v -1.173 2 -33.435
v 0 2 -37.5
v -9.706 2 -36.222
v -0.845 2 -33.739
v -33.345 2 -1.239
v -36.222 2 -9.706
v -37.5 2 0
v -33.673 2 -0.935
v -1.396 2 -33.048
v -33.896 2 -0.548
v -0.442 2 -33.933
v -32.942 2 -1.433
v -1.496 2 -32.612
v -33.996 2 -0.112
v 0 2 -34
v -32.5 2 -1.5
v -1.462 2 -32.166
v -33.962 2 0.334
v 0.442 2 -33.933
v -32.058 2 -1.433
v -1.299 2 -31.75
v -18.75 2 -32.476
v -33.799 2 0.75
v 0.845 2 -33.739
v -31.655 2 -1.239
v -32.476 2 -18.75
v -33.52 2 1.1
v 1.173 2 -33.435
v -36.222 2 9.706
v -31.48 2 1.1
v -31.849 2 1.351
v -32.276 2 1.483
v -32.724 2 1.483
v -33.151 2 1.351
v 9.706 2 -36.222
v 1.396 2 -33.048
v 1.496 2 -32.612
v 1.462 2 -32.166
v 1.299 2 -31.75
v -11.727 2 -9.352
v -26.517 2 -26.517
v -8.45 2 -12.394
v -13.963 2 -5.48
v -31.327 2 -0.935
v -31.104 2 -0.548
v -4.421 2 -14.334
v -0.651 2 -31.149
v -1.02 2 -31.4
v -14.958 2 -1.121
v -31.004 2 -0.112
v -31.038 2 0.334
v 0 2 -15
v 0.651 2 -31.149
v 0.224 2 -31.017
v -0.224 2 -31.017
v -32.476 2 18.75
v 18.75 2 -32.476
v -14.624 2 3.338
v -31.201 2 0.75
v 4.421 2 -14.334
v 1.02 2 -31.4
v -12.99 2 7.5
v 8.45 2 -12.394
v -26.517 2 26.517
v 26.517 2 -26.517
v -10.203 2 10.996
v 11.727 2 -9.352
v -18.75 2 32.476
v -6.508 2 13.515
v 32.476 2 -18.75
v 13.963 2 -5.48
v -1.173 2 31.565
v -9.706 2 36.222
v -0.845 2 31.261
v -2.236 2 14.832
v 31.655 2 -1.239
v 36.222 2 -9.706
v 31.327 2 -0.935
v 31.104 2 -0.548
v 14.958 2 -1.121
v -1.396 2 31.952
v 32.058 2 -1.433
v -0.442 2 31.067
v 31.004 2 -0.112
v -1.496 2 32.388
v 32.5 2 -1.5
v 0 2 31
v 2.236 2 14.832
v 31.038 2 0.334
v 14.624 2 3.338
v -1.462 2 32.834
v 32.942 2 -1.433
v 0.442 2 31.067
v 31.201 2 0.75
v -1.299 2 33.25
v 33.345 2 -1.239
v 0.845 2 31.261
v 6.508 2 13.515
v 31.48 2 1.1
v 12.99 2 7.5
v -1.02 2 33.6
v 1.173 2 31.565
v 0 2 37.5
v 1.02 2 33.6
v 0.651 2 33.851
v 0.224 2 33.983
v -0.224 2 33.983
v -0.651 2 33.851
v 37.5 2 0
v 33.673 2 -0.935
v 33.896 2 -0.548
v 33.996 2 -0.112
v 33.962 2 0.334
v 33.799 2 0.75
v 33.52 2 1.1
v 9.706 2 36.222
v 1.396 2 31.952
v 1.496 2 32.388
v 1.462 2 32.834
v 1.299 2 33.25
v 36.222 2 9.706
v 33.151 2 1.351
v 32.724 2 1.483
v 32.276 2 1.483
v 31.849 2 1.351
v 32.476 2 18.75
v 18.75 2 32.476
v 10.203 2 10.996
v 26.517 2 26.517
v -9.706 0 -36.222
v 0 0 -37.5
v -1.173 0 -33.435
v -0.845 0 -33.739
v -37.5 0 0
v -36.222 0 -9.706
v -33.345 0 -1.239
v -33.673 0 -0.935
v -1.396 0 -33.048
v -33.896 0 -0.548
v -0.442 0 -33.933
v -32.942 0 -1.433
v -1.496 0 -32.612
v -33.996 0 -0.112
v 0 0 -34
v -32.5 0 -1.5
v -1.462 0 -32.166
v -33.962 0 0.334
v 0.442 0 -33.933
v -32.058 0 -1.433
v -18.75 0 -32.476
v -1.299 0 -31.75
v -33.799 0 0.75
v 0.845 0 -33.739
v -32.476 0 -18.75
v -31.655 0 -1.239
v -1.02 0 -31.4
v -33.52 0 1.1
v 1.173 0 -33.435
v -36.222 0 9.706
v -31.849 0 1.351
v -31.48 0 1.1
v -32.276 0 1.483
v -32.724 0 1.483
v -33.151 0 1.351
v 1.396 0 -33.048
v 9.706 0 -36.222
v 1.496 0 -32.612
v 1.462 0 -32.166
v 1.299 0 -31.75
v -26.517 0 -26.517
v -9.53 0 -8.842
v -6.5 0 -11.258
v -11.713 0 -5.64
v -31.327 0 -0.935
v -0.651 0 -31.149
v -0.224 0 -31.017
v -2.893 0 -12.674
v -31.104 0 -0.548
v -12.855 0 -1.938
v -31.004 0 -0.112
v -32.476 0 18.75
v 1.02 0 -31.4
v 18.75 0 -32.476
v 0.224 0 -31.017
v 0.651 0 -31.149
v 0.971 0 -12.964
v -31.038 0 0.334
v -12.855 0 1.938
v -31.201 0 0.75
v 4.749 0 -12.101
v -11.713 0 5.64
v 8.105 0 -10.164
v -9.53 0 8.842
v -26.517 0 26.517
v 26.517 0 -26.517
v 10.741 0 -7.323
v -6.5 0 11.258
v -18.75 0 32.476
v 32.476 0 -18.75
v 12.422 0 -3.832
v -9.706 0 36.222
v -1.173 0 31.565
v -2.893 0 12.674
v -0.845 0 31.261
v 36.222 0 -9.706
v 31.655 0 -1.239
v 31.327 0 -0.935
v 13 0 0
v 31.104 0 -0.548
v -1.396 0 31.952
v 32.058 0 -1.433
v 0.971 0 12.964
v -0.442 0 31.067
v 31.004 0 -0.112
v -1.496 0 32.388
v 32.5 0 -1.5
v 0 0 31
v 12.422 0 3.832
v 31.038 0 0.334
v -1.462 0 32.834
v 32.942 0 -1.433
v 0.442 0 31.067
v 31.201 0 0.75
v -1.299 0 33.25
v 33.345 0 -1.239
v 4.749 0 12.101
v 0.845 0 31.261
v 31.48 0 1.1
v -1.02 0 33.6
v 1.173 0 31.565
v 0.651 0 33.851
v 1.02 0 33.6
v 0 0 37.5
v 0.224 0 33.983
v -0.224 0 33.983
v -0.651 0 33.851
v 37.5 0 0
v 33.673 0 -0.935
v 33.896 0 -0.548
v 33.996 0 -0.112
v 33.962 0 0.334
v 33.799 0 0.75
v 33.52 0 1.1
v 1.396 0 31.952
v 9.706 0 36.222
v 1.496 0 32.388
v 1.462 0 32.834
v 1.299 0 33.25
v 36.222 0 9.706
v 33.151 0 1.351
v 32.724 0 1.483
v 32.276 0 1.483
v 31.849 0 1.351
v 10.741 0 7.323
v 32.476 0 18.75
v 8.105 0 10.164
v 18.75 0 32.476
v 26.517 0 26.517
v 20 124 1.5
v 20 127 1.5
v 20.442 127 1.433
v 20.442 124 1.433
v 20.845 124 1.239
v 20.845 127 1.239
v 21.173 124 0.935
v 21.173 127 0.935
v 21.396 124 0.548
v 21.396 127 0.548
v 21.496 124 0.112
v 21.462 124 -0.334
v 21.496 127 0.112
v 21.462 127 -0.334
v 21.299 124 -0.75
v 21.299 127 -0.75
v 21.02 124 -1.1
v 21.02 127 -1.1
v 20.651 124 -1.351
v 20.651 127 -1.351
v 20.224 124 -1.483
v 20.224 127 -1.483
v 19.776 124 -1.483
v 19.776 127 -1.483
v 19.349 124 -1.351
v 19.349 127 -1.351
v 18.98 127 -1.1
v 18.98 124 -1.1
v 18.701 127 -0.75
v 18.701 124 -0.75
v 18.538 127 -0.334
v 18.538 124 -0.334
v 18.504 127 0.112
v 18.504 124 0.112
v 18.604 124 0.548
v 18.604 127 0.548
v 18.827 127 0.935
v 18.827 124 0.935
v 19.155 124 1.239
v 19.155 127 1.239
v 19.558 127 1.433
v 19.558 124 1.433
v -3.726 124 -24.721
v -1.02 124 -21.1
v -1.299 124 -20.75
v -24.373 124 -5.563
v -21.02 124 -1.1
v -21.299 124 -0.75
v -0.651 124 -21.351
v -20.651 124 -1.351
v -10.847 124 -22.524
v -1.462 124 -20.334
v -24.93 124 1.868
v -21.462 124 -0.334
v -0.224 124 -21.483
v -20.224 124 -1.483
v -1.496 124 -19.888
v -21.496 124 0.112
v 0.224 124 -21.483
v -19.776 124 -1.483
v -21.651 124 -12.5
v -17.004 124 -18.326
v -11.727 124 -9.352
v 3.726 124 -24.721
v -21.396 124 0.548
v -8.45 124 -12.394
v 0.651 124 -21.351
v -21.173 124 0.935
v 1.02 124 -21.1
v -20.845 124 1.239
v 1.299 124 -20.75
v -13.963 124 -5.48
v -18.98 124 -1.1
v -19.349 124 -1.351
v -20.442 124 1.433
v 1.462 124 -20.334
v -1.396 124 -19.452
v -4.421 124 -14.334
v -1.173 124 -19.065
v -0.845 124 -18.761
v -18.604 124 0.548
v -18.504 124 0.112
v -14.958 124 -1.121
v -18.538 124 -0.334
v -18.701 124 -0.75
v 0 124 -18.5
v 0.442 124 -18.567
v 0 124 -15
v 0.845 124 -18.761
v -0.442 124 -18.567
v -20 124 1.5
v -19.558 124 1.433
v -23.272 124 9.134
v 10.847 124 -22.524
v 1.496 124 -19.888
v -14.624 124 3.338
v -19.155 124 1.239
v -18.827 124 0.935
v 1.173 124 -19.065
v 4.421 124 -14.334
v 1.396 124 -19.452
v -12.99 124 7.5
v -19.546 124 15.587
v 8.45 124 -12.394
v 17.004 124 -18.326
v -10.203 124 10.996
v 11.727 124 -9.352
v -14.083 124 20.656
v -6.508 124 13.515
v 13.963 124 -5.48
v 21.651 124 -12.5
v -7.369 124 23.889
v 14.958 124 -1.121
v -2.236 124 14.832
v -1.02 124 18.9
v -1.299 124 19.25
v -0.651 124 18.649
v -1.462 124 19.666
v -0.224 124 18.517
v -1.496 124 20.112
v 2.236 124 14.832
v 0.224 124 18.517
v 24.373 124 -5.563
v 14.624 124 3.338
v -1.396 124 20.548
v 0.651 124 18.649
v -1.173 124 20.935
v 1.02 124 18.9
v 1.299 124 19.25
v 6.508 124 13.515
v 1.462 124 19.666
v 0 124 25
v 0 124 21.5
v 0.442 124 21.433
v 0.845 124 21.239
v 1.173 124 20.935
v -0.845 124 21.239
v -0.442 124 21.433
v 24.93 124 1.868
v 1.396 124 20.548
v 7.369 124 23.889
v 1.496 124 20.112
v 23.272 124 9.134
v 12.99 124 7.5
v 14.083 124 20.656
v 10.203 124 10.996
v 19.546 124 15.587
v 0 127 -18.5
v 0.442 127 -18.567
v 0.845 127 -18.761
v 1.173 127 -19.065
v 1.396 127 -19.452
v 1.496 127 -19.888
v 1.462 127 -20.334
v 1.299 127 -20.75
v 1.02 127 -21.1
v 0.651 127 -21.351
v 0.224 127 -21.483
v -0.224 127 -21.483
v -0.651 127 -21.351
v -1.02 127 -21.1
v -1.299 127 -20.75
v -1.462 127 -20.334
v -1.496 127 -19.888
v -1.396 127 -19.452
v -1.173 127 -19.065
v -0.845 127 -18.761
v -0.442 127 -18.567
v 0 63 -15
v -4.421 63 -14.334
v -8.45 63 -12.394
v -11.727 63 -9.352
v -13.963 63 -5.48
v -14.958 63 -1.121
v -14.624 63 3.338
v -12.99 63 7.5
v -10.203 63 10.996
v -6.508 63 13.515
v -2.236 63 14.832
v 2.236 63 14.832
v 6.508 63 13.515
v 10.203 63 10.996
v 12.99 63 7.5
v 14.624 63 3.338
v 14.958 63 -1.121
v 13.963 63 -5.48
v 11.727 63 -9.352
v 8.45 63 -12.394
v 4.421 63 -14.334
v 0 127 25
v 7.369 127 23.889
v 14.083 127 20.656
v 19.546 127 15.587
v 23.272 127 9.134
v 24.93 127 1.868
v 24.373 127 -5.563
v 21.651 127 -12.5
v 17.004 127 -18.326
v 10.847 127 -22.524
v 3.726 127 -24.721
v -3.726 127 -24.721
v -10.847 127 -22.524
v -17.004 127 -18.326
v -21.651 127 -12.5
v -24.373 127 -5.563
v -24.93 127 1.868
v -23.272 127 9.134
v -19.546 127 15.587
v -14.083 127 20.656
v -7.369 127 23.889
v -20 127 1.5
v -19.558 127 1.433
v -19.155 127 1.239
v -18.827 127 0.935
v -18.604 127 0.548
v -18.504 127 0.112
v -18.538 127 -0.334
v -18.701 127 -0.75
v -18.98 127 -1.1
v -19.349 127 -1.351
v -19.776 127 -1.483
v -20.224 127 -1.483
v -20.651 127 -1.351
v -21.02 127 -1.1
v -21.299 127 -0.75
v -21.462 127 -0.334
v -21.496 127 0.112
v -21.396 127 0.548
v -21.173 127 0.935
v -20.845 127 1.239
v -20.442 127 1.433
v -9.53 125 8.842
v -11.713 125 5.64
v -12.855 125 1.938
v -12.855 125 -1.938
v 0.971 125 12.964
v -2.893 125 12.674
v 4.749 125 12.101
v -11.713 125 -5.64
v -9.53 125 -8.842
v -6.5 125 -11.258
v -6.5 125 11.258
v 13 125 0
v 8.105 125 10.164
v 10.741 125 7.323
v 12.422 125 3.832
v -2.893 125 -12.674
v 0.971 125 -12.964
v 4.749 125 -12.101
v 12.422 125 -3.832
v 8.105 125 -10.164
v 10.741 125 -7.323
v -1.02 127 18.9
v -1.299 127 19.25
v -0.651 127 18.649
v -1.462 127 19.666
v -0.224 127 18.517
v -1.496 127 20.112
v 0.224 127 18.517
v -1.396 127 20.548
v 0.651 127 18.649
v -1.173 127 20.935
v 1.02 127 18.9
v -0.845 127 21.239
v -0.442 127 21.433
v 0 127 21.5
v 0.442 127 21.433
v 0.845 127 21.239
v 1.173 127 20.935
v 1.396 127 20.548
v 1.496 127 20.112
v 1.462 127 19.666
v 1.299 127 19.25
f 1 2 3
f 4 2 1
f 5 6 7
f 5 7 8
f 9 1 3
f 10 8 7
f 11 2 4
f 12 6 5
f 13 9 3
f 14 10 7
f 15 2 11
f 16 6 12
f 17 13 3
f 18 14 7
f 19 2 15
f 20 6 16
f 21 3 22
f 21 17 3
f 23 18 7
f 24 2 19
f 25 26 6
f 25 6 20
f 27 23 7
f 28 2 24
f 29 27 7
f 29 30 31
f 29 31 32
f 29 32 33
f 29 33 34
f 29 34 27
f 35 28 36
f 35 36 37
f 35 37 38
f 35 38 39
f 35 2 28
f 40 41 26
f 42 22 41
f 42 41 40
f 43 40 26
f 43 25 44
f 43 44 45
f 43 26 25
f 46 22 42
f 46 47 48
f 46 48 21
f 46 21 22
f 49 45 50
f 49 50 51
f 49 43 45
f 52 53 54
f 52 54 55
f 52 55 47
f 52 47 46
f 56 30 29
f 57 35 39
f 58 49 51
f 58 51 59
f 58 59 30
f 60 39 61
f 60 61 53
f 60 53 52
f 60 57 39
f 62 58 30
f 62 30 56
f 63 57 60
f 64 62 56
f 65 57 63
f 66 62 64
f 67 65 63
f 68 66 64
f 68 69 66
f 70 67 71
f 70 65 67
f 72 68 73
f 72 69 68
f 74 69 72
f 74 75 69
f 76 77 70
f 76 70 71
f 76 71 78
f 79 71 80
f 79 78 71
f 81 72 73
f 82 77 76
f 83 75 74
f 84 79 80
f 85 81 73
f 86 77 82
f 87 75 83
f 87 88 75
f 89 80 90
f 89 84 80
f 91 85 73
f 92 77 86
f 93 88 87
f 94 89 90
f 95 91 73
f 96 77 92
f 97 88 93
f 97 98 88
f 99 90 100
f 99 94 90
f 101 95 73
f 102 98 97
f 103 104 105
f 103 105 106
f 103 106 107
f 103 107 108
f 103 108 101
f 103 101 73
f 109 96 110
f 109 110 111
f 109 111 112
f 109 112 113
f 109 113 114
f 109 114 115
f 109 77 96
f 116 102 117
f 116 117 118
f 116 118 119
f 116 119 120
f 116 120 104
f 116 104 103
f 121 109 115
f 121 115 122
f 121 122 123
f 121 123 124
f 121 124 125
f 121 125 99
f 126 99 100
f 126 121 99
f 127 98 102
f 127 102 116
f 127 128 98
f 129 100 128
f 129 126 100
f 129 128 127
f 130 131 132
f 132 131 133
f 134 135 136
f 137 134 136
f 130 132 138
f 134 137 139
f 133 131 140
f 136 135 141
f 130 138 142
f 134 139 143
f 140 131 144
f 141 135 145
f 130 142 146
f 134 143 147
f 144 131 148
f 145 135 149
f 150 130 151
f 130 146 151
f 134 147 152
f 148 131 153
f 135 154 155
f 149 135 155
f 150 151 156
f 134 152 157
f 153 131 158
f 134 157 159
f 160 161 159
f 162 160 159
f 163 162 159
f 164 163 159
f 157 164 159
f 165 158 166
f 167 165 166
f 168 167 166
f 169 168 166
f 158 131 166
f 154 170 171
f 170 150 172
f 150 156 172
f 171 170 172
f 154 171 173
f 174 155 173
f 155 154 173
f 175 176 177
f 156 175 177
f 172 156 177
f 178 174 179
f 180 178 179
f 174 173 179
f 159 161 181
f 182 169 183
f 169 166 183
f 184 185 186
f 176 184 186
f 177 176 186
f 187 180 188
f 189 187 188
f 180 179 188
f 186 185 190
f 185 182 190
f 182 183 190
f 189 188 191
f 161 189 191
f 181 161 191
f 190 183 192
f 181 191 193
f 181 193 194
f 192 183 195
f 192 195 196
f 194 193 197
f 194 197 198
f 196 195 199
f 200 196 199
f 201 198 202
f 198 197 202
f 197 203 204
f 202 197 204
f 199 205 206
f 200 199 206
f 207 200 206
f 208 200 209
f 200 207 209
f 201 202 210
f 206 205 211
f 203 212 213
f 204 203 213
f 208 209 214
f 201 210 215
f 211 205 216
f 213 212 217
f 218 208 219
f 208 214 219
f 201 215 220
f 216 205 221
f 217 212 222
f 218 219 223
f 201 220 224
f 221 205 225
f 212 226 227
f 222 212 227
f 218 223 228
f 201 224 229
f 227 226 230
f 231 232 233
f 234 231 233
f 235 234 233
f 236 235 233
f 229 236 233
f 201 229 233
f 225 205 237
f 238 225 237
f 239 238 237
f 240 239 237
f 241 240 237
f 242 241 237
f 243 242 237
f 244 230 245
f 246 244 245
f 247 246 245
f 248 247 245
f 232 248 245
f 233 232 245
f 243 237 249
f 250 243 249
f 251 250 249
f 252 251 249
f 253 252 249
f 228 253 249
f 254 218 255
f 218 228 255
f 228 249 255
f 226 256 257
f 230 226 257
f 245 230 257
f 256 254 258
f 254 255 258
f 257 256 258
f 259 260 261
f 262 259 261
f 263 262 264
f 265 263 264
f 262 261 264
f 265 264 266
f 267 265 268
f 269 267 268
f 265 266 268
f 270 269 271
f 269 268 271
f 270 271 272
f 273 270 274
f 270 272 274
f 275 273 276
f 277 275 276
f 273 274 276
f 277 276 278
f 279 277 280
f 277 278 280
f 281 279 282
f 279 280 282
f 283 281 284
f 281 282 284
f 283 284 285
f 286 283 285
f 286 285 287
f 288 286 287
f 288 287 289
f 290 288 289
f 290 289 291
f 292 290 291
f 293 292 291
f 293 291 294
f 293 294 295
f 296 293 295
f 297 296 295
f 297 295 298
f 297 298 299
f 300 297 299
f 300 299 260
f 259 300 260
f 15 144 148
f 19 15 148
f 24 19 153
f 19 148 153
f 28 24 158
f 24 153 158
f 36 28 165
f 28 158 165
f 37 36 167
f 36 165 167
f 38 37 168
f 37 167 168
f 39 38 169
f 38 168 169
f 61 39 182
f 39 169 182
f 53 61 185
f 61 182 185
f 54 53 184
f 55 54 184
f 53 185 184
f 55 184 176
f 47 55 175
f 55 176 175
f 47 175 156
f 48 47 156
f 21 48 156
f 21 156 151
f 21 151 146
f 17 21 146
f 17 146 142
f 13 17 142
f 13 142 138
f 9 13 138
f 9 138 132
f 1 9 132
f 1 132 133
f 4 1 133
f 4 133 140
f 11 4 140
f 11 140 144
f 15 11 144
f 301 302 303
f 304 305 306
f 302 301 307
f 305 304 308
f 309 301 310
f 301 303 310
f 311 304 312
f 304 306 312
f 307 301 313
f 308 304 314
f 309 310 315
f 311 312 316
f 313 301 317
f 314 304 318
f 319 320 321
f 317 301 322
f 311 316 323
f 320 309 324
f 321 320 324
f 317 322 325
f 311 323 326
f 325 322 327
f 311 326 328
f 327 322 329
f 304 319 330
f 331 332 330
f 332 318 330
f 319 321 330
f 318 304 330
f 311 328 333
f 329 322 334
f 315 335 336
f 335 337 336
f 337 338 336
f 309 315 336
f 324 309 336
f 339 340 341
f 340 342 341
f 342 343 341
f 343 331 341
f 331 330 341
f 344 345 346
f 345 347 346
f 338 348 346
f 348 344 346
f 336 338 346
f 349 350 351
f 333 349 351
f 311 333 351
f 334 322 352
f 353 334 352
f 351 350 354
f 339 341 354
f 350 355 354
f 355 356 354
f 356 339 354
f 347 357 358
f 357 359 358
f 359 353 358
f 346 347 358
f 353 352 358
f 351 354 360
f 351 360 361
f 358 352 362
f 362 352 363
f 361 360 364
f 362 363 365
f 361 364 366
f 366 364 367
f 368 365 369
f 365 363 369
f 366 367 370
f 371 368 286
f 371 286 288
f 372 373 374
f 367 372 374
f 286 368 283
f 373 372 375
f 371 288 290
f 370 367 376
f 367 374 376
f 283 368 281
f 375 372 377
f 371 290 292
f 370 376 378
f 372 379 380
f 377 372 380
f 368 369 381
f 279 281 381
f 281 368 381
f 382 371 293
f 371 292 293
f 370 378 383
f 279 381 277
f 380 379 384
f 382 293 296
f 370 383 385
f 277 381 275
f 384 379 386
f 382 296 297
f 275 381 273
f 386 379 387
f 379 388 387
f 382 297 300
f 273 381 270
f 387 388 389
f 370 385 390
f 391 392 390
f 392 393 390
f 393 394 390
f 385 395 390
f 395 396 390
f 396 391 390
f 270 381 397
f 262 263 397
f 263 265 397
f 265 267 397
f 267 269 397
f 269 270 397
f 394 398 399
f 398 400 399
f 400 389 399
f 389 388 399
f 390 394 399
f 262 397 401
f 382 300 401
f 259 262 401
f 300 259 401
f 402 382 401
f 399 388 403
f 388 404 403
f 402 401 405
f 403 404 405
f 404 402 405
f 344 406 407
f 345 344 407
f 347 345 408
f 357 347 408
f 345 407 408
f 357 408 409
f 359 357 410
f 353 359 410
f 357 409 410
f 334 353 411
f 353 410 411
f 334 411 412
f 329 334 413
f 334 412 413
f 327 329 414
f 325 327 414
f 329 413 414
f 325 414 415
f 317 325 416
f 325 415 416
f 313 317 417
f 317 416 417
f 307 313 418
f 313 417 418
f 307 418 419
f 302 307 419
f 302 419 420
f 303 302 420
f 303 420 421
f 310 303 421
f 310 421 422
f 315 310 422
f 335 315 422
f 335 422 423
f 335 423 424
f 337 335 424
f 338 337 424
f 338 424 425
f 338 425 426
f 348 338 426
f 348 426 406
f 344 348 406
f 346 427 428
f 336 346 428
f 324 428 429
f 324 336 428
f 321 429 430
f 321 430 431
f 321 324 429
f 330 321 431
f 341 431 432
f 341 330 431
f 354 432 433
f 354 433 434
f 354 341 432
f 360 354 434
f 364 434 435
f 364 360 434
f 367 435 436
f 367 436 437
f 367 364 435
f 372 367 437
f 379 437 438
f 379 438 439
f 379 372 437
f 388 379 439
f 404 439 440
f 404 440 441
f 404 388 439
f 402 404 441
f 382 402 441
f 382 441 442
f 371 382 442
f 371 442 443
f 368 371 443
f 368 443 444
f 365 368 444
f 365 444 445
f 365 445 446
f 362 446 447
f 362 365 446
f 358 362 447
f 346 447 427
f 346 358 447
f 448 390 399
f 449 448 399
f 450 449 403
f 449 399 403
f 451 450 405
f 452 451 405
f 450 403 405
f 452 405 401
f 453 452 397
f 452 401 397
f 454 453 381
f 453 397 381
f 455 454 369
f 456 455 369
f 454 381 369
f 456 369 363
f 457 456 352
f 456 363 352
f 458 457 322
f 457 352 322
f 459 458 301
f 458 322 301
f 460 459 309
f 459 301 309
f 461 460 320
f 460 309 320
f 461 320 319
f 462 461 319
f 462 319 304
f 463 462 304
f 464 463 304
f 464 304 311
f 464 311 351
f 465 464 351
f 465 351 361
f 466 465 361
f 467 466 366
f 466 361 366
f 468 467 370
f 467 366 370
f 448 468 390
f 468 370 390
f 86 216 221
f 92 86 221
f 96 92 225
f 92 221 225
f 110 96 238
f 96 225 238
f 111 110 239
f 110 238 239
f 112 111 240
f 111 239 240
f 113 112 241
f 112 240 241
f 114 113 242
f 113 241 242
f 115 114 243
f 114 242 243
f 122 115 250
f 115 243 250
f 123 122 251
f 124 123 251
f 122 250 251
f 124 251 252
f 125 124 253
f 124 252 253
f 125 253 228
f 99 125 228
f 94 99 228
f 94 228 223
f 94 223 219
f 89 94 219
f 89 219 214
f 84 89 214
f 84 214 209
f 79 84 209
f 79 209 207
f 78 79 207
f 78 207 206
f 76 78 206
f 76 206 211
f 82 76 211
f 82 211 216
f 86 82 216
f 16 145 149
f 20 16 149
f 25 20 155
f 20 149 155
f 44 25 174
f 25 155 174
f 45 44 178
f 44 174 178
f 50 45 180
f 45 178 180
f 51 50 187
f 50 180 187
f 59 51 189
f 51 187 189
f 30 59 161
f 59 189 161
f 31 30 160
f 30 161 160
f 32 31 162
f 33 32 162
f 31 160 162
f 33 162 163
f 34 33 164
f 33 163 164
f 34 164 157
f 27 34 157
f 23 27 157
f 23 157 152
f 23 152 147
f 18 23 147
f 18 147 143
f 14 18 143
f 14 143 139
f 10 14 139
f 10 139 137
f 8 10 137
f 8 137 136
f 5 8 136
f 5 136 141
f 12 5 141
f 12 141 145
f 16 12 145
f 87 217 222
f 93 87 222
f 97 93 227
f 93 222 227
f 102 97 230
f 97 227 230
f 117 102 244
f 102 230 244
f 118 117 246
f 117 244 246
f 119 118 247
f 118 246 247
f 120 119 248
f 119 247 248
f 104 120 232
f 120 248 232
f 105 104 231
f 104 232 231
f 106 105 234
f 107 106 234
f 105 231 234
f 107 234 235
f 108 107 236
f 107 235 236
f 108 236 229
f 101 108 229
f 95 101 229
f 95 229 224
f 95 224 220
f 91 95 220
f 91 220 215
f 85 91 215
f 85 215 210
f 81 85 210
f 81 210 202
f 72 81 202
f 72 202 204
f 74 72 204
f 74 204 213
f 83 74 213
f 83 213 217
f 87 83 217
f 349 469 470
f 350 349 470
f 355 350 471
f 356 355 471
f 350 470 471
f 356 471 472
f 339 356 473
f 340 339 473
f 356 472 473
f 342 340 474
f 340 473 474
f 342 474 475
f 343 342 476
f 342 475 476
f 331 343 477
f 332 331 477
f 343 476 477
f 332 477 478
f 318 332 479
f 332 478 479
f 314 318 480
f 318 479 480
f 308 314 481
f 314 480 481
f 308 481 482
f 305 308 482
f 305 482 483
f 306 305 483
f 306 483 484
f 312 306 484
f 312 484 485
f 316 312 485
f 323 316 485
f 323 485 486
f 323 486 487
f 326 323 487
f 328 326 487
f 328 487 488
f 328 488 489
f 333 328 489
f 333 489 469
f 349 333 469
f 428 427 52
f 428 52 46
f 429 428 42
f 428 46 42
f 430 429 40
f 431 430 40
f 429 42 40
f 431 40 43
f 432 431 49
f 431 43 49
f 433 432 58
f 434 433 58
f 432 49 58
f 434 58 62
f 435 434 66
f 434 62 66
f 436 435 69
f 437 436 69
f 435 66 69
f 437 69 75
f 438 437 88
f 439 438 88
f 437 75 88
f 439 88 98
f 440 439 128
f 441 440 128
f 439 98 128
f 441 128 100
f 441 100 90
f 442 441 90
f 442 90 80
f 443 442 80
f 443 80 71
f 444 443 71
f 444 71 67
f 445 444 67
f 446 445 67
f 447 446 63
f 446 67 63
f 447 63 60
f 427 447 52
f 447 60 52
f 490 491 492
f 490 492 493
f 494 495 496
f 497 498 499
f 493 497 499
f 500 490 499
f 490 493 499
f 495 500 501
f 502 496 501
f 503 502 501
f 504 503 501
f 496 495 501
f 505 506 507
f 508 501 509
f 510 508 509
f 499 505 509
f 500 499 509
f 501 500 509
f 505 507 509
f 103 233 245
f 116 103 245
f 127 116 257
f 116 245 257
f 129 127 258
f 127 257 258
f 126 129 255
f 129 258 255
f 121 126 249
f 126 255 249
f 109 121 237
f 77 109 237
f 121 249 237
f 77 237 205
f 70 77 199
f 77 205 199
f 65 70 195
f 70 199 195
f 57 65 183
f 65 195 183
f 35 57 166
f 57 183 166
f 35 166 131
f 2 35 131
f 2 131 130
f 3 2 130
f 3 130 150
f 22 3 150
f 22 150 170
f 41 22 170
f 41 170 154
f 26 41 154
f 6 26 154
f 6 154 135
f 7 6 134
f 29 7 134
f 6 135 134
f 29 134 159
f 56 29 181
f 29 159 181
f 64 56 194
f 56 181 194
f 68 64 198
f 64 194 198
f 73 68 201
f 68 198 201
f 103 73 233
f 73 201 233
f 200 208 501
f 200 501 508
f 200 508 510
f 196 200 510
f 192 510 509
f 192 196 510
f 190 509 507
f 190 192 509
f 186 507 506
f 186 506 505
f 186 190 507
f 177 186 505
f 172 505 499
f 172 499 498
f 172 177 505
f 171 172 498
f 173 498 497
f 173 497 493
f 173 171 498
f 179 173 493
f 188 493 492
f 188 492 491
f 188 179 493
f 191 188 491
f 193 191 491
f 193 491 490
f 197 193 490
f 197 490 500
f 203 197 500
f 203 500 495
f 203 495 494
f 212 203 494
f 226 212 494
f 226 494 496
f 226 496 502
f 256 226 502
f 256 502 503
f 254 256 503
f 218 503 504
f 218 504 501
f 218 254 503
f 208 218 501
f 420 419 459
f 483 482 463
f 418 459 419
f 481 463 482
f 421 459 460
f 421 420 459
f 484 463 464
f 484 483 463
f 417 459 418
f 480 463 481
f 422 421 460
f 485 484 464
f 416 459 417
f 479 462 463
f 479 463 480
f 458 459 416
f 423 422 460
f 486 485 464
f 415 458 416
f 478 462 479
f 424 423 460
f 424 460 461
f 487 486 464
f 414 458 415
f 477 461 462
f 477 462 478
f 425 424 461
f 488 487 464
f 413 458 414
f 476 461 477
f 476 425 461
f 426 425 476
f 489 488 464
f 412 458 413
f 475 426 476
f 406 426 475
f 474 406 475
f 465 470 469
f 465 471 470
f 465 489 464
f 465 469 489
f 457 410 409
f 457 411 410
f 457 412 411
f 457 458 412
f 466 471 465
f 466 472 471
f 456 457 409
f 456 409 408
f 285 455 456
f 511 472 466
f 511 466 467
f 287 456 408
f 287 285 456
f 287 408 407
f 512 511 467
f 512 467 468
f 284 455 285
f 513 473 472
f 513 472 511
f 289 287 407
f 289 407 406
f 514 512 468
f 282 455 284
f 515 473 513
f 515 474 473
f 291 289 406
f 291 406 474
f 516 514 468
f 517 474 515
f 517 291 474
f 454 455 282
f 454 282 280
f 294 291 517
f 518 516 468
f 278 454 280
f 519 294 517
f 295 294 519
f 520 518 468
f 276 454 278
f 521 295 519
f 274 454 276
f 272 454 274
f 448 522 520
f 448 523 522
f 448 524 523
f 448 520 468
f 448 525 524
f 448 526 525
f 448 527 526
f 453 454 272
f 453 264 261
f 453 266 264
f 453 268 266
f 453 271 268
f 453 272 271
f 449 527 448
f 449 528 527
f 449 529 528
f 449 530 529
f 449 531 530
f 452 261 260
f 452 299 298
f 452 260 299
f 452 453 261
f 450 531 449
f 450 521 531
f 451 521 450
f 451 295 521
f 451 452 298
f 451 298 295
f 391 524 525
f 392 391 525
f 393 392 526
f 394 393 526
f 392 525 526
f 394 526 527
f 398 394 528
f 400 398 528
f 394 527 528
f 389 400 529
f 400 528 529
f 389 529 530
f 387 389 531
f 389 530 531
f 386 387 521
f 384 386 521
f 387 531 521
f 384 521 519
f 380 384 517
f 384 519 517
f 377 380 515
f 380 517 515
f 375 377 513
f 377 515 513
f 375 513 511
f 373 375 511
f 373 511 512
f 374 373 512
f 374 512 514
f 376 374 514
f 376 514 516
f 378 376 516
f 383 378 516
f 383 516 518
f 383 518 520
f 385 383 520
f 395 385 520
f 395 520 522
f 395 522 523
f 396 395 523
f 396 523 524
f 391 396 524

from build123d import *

# Parameters (mm, degrees)
SKETCH2_R           = 37.5
BOSS_EXTRUDE1_DEPTH = 2
SKETCH4_R           = 15
BOSS_EXTRUDE2_DEPTH = 61
SKETCH5_R           = 25
BOSS_EXTRUDE3_DEPTH = 3
CUT_EXTRUDE1_REACH  = 139.628
SKETCH6_R           = 1.5
CUT_EXTRUDE2_REACH  = 139.628
SKETCH7_R           = 1.5
SHELL1_OUTLINE_R    = 13
SHELL1_DEPTH        = 125


# Read off the part's stored shape, not the designer's step: Shell1
with BuildPart() as part:
    # Sketch2 → Boss-Extrude1 (new body)
    with BuildSketch(Plane(origin=(0, 0, 0), x_dir=(1, 0, 0), z_dir=(0, 1, 0))):
        with Locations(Location((0, 0, 0), (0, 0, 270))):
            Circle(SKETCH2_R)
    extrude(amount=BOSS_EXTRUDE1_DEPTH)

    # Sketch4 → Boss-Extrude2 (add)
    with BuildSketch(Plane(origin=(0, 2, 0), x_dir=(1, 0, 0), z_dir=(0, 1, 0))):
        with Locations(Location((0, 0, 0), (0, 0, 90))):
            Circle(SKETCH4_R)
    boss_extrude2 = extrude(amount=BOSS_EXTRUDE2_DEPTH)

    # Mirror1: Boss-Extrude2 across plane
    add(boss_extrude2.mirror(Plane.ZX.offset(63)))

    # Sketch5 → Boss-Extrude3 (add)
    with BuildSketch(Plane(origin=(0, 124, 0), x_dir=(1, 0, 0), z_dir=(0, 1, 0))):
        with Locations(Location((0, 0, 0), (0, 0, 270))):
            Circle(SKETCH5_R)
    extrude(amount=BOSS_EXTRUDE3_DEPTH)

    # Sketch6 → Cut-Extrude1 (cut, up to next)
    with BuildSketch(Plane(origin=(0, 127, 0), x_dir=(1, 0, 0), z_dir=(0, 1, 0)), mode=Mode.PRIVATE) as cut_extrude1_sk1:
        with Locations(Location((0, 20, 0), (0, 0, 270))):
            Circle(SKETCH6_R)
    cut_extrude1_tool1 = extrude(cut_extrude1_sk1.sketch, amount=-CUT_EXTRUDE1_REACH, mode=Mode.PRIVATE) & part.part
    # Sketch6 → Cut-Extrude1 (cut, up to next)
    with BuildSketch(Plane(origin=(0, 127, 0), x_dir=(1, 0, 0), z_dir=(0, 1, 0)), mode=Mode.PRIVATE) as cut_extrude1_sk2:
        with Locations(Location((20, 0, 0), (0, 0, 270))):
            Circle(SKETCH6_R)
    cut_extrude1_tool2 = extrude(cut_extrude1_sk2.sketch, amount=-CUT_EXTRUDE1_REACH, mode=Mode.PRIVATE) & part.part
    # Sketch6 → Cut-Extrude1 (cut, up to next)
    with BuildSketch(Plane(origin=(0, 127, 0), x_dir=(1, 0, 0), z_dir=(0, 1, 0)), mode=Mode.PRIVATE) as cut_extrude1_sk3:
        with Locations(Location((0, -20, 0), (0, 0, 270))):
            Circle(SKETCH6_R)
    cut_extrude1_tool3 = extrude(cut_extrude1_sk3.sketch, amount=-CUT_EXTRUDE1_REACH, mode=Mode.PRIVATE) & part.part
    # Sketch6 → Cut-Extrude1 (cut, up to next)
    with BuildSketch(Plane(origin=(0, 127, 0), x_dir=(1, 0, 0), z_dir=(0, 1, 0)), mode=Mode.PRIVATE) as cut_extrude1_sk4:
        with Locations(Location((-20, 0, 0), (0, 0, 270))):
            Circle(SKETCH6_R)
    cut_extrude1_tool4 = extrude(cut_extrude1_sk4.sketch, amount=-CUT_EXTRUDE1_REACH, mode=Mode.PRIVATE) & part.part
    add(cut_extrude1_tool1.solids().sort_by_distance((0, 127, -20))[0], mode=Mode.SUBTRACT)
    add(cut_extrude1_tool2.solids().sort_by_distance((20, 127, 0))[0], mode=Mode.SUBTRACT)
    add(cut_extrude1_tool3.solids().sort_by_distance((0, 127, 20))[0], mode=Mode.SUBTRACT)
    add(cut_extrude1_tool4.solids().sort_by_distance((-20, 127, 0))[0], mode=Mode.SUBTRACT)

    # Sketch7 → Cut-Extrude2 (cut, up to next)
    with BuildSketch(Plane.XZ, mode=Mode.PRIVATE) as cut_extrude2_sk1:
        with Locations(Location((0, 32.5, 0), (0, 0, 270))):
            Circle(SKETCH7_R)
    cut_extrude2_tool1 = extrude(cut_extrude2_sk1.sketch, amount=-CUT_EXTRUDE2_REACH, mode=Mode.PRIVATE) & part.part
    # Sketch7 → Cut-Extrude2 (cut, up to next)
    with BuildSketch(Plane.XZ, mode=Mode.PRIVATE) as cut_extrude2_sk2:
        with Locations(Location((32.5, 0, 0), (0, 0, 270))):
            Circle(SKETCH7_R)
    cut_extrude2_tool2 = extrude(cut_extrude2_sk2.sketch, amount=-CUT_EXTRUDE2_REACH, mode=Mode.PRIVATE) & part.part
    # Sketch7 → Cut-Extrude2 (cut, up to next)
    with BuildSketch(Plane.XZ, mode=Mode.PRIVATE) as cut_extrude2_sk3:
        with Locations(Location((0, -32.5, 0), (0, 0, 270))):
            Circle(SKETCH7_R)
    cut_extrude2_tool3 = extrude(cut_extrude2_sk3.sketch, amount=-CUT_EXTRUDE2_REACH, mode=Mode.PRIVATE) & part.part
    # Sketch7 → Cut-Extrude2 (cut, up to next)
    with BuildSketch(Plane.XZ, mode=Mode.PRIVATE) as cut_extrude2_sk4:
        with Locations(Location((-32.5, 0, 0), (0, 0, 270))):
            Circle(SKETCH7_R)
    cut_extrude2_tool4 = extrude(cut_extrude2_sk4.sketch, amount=-CUT_EXTRUDE2_REACH, mode=Mode.PRIVATE) & part.part
    add(cut_extrude2_tool1.solids().sort_by_distance((0, 0, 32.5))[0], mode=Mode.SUBTRACT)
    add(cut_extrude2_tool2.solids().sort_by_distance((32.5, 0, 0))[0], mode=Mode.SUBTRACT)
    add(cut_extrude2_tool3.solids().sort_by_distance((0, 0, -32.5))[0], mode=Mode.SUBTRACT)
    add(cut_extrude2_tool4.solids().sort_by_distance((-32.5, 0, 0))[0], mode=Mode.SUBTRACT)

    # Shell1 outline → Shell1 (cut)
    with BuildSketch(Plane(origin=(0, 0, 0), x_dir=(1, 0, 0), z_dir=(0, 1, 0))):
        Circle(SHELL1_OUTLINE_R)
    extrude(amount=SHELL1_DEPTH, mode=Mode.SUBTRACT)


solid = part.part
